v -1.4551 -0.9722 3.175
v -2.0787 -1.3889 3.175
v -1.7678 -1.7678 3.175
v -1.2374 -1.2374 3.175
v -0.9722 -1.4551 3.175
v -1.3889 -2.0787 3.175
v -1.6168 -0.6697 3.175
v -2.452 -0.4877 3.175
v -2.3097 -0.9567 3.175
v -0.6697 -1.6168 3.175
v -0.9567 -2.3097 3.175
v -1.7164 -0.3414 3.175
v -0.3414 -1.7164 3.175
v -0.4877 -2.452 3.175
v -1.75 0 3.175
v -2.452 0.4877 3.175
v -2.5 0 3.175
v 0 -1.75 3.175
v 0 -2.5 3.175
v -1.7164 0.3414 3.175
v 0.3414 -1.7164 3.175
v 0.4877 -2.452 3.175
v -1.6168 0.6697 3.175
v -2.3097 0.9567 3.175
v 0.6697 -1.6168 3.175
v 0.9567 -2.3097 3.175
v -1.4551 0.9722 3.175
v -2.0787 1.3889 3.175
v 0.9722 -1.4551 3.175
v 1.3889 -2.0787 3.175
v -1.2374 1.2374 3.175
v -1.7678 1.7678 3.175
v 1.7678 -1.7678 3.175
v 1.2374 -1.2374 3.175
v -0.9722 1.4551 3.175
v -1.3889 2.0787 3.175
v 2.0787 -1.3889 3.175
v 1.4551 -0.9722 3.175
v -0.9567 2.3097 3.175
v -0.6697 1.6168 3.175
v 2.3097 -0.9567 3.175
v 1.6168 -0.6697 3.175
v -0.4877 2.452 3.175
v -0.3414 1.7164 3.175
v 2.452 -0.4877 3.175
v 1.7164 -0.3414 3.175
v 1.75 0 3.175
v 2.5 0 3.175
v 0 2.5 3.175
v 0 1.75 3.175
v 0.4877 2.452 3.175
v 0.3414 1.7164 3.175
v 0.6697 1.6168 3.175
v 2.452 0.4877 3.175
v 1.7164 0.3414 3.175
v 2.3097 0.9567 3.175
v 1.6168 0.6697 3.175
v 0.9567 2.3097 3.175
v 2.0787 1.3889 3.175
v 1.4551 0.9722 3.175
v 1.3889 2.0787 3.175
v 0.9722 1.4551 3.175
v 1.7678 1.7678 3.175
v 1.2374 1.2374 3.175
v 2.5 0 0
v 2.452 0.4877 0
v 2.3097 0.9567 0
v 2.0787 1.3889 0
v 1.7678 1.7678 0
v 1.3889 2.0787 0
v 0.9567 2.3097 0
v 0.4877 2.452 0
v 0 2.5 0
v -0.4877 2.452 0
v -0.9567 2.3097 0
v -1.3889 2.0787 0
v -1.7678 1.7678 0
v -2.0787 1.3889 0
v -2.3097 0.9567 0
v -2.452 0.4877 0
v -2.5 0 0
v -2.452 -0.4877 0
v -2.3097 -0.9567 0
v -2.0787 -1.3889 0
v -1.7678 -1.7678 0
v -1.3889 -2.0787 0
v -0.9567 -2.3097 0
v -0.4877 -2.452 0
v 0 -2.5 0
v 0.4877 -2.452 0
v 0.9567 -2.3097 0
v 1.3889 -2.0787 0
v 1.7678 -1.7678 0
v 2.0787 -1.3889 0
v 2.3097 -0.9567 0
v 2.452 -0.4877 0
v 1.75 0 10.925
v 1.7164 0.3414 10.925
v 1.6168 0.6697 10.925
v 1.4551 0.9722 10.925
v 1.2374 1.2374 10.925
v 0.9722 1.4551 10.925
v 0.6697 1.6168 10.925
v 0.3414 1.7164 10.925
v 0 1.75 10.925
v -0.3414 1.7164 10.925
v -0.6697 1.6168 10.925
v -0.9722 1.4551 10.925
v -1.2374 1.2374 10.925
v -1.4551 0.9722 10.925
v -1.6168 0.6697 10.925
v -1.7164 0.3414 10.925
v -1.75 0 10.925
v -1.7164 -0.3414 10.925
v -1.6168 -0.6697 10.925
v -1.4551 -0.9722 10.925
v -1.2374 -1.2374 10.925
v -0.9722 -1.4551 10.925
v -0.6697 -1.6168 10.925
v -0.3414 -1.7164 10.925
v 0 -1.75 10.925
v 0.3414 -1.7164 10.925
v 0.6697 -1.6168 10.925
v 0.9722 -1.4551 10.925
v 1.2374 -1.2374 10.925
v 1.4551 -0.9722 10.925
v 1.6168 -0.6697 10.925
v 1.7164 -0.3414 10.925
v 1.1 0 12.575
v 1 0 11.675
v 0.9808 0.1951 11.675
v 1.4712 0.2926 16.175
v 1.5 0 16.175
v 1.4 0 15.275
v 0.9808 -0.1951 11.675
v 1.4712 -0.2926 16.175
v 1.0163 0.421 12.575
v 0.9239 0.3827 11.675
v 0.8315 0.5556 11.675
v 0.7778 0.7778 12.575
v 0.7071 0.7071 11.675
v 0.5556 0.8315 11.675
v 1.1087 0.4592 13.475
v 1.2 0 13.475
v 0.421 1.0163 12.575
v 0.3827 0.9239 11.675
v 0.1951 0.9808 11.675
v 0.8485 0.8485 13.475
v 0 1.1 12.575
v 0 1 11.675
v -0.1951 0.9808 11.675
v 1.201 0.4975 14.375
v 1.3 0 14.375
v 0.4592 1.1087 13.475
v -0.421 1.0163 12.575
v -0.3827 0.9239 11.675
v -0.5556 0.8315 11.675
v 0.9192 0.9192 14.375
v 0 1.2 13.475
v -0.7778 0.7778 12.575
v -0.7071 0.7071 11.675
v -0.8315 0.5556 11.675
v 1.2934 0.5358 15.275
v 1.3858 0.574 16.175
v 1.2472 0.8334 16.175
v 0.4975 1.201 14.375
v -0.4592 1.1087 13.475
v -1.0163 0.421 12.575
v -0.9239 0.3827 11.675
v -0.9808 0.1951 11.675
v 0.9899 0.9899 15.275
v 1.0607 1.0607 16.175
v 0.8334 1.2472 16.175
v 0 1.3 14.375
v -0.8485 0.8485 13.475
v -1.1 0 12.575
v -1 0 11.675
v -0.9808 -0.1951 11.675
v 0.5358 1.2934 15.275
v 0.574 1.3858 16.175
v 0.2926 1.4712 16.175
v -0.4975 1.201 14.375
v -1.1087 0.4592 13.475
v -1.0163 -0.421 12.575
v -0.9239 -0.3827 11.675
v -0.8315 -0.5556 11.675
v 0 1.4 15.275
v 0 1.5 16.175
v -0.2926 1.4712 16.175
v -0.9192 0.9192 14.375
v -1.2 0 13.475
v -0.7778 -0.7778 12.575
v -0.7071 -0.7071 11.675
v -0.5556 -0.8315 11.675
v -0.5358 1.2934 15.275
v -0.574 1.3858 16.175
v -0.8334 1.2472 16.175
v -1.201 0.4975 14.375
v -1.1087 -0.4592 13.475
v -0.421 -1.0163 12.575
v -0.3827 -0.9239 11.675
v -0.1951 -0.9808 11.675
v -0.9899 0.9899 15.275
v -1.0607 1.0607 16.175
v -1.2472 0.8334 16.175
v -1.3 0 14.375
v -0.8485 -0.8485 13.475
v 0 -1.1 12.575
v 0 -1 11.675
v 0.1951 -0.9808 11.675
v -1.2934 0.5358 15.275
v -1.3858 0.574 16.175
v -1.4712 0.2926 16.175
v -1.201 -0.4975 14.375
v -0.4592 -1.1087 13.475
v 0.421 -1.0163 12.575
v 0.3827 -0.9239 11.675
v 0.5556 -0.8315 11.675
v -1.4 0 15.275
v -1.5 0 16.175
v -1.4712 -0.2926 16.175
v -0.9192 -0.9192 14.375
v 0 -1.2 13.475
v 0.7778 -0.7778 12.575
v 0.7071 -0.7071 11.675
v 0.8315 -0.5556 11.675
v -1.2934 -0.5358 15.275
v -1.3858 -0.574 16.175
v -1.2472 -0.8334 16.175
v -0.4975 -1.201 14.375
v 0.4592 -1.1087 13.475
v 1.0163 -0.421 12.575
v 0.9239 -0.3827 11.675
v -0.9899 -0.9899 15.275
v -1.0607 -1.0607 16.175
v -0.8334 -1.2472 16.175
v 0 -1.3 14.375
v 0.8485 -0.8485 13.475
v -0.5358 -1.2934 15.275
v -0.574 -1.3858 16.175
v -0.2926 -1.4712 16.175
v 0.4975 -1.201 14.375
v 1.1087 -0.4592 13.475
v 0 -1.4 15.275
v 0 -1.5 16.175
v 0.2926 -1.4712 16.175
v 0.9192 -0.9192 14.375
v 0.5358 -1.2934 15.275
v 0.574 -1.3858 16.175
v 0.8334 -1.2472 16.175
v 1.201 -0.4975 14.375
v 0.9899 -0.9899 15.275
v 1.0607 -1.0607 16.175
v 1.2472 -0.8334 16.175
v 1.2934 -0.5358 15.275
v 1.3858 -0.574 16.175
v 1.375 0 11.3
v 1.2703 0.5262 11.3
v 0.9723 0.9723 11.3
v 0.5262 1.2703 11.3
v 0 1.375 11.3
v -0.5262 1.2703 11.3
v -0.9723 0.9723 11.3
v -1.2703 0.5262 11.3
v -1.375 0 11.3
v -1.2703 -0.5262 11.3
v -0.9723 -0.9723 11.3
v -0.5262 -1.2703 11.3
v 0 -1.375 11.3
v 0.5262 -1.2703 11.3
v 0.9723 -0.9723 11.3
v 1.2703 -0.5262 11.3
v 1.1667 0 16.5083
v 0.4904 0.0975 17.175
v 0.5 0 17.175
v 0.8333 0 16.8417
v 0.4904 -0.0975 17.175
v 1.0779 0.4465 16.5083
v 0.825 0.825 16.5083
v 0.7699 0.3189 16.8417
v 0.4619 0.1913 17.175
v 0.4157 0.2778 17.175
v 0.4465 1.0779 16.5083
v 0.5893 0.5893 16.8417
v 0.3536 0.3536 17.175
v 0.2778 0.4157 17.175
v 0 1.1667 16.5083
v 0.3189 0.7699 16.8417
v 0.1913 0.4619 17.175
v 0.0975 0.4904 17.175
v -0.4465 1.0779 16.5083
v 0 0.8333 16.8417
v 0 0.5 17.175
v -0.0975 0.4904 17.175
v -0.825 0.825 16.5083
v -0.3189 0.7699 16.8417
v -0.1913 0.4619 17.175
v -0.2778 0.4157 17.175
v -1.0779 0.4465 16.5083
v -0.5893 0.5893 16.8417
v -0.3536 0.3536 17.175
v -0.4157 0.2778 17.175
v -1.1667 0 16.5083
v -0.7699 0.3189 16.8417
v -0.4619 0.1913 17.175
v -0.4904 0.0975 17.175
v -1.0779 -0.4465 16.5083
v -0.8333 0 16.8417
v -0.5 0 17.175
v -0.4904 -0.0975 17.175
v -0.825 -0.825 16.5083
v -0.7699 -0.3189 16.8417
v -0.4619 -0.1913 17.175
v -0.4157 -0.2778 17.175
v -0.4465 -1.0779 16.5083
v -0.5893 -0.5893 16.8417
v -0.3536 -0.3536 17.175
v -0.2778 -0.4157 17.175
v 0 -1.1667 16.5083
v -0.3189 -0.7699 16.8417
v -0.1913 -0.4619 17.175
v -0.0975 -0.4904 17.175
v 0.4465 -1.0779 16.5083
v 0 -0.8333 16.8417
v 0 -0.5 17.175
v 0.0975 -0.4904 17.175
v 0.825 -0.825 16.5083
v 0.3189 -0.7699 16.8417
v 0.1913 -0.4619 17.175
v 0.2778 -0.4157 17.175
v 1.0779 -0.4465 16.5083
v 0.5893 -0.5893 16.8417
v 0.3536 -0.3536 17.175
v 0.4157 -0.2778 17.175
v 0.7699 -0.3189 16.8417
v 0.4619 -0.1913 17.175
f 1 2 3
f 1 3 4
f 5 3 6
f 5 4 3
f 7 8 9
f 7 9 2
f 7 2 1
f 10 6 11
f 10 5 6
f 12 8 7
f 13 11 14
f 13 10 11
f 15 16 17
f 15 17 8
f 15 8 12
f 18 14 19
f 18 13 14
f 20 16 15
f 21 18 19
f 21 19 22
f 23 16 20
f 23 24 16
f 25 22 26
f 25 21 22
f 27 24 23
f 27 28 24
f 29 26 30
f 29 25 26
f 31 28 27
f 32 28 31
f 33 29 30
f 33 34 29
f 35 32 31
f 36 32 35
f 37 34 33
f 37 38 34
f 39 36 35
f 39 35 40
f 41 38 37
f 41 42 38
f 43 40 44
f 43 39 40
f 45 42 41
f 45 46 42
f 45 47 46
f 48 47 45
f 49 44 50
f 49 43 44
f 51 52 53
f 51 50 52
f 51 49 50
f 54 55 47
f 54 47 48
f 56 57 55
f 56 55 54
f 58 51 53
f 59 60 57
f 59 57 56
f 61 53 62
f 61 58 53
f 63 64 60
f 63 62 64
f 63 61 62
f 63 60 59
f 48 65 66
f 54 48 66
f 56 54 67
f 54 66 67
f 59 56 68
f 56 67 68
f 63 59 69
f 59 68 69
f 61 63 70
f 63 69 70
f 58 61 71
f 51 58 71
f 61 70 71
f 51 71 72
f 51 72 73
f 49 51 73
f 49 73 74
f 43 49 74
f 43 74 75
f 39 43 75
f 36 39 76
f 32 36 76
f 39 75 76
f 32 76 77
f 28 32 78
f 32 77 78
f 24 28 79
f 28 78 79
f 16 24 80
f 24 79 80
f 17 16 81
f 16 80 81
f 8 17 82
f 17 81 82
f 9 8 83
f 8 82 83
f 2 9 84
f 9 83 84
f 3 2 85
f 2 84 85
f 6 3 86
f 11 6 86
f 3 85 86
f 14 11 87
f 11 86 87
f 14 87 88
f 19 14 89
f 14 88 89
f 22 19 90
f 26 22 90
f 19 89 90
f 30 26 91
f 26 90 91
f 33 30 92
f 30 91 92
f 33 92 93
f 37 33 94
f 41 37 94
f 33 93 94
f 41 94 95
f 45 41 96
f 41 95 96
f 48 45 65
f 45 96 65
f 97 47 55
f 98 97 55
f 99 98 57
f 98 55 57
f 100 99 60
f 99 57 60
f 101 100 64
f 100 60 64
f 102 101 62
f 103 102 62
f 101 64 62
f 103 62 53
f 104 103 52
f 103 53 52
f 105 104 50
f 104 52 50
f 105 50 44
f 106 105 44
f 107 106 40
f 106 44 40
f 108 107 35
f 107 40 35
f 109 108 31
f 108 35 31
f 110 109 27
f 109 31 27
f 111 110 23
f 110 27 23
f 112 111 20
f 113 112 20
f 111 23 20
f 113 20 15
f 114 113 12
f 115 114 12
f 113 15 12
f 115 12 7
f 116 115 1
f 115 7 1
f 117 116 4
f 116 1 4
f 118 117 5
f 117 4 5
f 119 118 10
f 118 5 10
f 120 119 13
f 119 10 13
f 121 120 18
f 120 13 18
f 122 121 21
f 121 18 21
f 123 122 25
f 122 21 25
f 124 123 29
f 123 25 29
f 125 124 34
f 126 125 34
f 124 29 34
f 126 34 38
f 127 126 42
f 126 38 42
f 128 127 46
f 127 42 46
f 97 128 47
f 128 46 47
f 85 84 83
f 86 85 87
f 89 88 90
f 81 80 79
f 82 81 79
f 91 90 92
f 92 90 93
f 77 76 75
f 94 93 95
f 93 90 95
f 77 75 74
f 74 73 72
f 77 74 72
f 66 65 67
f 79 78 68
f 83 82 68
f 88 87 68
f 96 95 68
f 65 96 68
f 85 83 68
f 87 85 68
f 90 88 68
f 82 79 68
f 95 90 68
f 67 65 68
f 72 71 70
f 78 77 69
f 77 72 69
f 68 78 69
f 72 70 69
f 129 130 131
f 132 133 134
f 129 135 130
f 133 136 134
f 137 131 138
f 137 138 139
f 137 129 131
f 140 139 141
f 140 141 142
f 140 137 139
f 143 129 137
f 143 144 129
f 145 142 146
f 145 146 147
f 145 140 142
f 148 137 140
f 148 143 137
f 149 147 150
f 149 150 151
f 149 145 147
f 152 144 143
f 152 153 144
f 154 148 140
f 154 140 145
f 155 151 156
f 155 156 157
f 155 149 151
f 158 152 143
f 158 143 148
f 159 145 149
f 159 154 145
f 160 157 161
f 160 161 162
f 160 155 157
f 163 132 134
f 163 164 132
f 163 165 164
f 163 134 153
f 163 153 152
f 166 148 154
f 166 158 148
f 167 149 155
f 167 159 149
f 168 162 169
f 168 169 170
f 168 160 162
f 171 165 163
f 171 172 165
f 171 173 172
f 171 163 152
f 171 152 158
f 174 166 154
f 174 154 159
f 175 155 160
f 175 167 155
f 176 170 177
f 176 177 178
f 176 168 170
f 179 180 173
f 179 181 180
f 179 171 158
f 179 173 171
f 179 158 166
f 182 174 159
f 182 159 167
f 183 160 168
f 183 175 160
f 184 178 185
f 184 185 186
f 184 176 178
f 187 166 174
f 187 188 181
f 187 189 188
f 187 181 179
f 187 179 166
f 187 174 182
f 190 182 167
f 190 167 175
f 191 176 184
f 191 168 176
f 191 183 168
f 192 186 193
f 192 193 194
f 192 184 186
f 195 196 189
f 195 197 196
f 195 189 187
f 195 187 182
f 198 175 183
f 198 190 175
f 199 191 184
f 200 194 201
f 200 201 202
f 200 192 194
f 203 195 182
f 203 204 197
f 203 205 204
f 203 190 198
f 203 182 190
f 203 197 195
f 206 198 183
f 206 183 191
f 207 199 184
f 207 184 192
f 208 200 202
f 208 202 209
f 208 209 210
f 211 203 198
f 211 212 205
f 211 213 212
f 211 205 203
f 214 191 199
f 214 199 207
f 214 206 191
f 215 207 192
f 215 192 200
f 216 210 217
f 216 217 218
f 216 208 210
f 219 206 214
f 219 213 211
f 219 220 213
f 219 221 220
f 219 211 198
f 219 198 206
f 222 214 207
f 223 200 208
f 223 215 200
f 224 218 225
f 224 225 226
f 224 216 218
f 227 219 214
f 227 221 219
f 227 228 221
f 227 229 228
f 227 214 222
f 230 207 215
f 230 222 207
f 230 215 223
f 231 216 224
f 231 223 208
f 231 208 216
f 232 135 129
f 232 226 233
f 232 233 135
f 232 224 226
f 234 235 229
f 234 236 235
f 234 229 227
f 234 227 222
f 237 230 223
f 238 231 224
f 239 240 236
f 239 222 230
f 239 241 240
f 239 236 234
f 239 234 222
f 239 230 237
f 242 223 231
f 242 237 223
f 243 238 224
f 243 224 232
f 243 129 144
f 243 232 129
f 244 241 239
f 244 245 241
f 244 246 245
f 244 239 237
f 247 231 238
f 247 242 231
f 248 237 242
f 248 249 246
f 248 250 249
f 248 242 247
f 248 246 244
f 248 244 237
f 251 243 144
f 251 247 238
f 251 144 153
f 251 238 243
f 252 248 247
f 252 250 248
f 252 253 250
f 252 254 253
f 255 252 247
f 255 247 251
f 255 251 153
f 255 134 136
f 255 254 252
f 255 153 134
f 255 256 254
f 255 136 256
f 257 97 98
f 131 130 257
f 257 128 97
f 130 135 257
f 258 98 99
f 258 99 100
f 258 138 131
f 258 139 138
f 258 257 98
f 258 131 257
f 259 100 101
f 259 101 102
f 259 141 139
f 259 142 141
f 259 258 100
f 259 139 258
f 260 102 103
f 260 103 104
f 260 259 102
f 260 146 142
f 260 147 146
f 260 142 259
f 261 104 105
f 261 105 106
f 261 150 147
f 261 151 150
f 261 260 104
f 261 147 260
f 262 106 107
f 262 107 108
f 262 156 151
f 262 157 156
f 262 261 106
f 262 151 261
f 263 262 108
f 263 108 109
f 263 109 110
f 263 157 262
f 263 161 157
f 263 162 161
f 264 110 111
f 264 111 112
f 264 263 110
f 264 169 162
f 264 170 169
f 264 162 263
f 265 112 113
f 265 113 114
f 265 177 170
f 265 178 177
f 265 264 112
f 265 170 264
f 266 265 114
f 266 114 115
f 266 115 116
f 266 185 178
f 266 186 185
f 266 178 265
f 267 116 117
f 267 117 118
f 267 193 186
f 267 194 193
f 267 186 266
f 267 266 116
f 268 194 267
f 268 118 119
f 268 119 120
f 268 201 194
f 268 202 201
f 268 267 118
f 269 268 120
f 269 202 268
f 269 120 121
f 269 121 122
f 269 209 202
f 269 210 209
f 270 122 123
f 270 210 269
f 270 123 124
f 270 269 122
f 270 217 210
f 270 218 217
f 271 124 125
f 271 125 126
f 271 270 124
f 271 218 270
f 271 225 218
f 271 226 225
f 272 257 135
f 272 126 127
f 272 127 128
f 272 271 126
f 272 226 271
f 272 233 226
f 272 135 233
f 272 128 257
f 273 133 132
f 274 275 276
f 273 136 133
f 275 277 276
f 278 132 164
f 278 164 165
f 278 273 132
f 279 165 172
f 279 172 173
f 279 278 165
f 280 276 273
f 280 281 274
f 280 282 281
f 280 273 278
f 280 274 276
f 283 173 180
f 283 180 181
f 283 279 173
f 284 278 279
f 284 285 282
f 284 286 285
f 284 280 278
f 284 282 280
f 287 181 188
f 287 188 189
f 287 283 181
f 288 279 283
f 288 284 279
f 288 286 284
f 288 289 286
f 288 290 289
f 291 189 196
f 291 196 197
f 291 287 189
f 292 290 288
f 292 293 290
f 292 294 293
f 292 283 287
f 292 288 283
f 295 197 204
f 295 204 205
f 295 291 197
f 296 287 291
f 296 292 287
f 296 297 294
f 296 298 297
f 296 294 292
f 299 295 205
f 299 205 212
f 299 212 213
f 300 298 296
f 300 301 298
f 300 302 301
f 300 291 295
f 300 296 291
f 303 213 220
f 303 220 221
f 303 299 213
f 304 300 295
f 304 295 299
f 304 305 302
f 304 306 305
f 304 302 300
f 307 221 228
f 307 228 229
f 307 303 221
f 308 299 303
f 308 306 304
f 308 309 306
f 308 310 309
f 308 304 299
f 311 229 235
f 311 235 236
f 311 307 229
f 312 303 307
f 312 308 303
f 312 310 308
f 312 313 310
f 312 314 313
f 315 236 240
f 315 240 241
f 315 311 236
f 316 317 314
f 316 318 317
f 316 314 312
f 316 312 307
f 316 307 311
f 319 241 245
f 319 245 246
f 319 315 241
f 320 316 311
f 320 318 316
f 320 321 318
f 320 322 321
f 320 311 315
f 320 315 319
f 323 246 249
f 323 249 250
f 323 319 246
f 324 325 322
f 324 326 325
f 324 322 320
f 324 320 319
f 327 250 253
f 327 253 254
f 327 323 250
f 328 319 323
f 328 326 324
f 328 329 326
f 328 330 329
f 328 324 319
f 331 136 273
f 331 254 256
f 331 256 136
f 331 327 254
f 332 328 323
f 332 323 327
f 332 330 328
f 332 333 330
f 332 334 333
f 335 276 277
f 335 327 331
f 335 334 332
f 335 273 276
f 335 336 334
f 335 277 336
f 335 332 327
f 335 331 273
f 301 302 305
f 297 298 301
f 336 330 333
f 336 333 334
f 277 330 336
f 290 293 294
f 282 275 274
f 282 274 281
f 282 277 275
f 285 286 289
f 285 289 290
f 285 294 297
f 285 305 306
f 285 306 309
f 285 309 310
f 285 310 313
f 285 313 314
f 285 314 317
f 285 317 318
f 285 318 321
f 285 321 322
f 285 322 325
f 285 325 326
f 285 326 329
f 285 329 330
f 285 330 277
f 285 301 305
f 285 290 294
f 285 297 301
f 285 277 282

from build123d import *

# Parameters (mm, degrees)
F0_R      = 2.5
F1_DEPTH  = 3.175
F2_R      = 1.75
F3_DEPTH  = 8.5
F4_SIZE   = 0.75
F5_R      = 1
F7_R      = 1.5
F9_R      = 1.5
F10_DEPTH = 1
F11_SIZE  = 0.99999


# Not quite as in the source:
# - a fillet or chamfer is up to 0.001 mm smaller than in the source, because OpenCascade refuses the exact size


with BuildPart() as f1:
    # F0 (on Top) → F1 (new body)
    with BuildSketch(Plane.XY):
        Circle(F0_R)
    extrude(amount=F1_DEPTH)

    # F2 (on face) → F3 (join)
    with BuildSketch(Plane.XY.offset(3.175)):
        Circle(F2_R)
    extrude(amount=F3_DEPTH)

    # F4
    f4_edges = [f1.edges().sort_by_distance(p)[0] for p in [
        (-1.75, 0, 11.675),
    ]]
    chamfer(f4_edges, length=F4_SIZE)

    # F5 (on face) → F8 section 0
    with BuildSketch(Plane.XY.offset(11.675)):
        Circle(F5_R)
    # F7 (on offset) → F8 section 1
    with BuildSketch(Plane.XY.offset(16.175)):
        Circle(F7_R)
    loft()

    # F9 (on face) → F10 (join)
    with BuildSketch(Plane.XY.offset(16.175)):
        Circle(F9_R)
    extrude(amount=F10_DEPTH)

    # F11 (size 1 in the source; OpenCascade refuses exactly that, so slightly less here)
    f11_edges = [f1.edges().sort_by_distance(p)[0] for p in [
        (-1.5, 0, 17.175),
    ]]
    chamfer(f11_edges, length=F11_SIZE)


solid = f1.part
